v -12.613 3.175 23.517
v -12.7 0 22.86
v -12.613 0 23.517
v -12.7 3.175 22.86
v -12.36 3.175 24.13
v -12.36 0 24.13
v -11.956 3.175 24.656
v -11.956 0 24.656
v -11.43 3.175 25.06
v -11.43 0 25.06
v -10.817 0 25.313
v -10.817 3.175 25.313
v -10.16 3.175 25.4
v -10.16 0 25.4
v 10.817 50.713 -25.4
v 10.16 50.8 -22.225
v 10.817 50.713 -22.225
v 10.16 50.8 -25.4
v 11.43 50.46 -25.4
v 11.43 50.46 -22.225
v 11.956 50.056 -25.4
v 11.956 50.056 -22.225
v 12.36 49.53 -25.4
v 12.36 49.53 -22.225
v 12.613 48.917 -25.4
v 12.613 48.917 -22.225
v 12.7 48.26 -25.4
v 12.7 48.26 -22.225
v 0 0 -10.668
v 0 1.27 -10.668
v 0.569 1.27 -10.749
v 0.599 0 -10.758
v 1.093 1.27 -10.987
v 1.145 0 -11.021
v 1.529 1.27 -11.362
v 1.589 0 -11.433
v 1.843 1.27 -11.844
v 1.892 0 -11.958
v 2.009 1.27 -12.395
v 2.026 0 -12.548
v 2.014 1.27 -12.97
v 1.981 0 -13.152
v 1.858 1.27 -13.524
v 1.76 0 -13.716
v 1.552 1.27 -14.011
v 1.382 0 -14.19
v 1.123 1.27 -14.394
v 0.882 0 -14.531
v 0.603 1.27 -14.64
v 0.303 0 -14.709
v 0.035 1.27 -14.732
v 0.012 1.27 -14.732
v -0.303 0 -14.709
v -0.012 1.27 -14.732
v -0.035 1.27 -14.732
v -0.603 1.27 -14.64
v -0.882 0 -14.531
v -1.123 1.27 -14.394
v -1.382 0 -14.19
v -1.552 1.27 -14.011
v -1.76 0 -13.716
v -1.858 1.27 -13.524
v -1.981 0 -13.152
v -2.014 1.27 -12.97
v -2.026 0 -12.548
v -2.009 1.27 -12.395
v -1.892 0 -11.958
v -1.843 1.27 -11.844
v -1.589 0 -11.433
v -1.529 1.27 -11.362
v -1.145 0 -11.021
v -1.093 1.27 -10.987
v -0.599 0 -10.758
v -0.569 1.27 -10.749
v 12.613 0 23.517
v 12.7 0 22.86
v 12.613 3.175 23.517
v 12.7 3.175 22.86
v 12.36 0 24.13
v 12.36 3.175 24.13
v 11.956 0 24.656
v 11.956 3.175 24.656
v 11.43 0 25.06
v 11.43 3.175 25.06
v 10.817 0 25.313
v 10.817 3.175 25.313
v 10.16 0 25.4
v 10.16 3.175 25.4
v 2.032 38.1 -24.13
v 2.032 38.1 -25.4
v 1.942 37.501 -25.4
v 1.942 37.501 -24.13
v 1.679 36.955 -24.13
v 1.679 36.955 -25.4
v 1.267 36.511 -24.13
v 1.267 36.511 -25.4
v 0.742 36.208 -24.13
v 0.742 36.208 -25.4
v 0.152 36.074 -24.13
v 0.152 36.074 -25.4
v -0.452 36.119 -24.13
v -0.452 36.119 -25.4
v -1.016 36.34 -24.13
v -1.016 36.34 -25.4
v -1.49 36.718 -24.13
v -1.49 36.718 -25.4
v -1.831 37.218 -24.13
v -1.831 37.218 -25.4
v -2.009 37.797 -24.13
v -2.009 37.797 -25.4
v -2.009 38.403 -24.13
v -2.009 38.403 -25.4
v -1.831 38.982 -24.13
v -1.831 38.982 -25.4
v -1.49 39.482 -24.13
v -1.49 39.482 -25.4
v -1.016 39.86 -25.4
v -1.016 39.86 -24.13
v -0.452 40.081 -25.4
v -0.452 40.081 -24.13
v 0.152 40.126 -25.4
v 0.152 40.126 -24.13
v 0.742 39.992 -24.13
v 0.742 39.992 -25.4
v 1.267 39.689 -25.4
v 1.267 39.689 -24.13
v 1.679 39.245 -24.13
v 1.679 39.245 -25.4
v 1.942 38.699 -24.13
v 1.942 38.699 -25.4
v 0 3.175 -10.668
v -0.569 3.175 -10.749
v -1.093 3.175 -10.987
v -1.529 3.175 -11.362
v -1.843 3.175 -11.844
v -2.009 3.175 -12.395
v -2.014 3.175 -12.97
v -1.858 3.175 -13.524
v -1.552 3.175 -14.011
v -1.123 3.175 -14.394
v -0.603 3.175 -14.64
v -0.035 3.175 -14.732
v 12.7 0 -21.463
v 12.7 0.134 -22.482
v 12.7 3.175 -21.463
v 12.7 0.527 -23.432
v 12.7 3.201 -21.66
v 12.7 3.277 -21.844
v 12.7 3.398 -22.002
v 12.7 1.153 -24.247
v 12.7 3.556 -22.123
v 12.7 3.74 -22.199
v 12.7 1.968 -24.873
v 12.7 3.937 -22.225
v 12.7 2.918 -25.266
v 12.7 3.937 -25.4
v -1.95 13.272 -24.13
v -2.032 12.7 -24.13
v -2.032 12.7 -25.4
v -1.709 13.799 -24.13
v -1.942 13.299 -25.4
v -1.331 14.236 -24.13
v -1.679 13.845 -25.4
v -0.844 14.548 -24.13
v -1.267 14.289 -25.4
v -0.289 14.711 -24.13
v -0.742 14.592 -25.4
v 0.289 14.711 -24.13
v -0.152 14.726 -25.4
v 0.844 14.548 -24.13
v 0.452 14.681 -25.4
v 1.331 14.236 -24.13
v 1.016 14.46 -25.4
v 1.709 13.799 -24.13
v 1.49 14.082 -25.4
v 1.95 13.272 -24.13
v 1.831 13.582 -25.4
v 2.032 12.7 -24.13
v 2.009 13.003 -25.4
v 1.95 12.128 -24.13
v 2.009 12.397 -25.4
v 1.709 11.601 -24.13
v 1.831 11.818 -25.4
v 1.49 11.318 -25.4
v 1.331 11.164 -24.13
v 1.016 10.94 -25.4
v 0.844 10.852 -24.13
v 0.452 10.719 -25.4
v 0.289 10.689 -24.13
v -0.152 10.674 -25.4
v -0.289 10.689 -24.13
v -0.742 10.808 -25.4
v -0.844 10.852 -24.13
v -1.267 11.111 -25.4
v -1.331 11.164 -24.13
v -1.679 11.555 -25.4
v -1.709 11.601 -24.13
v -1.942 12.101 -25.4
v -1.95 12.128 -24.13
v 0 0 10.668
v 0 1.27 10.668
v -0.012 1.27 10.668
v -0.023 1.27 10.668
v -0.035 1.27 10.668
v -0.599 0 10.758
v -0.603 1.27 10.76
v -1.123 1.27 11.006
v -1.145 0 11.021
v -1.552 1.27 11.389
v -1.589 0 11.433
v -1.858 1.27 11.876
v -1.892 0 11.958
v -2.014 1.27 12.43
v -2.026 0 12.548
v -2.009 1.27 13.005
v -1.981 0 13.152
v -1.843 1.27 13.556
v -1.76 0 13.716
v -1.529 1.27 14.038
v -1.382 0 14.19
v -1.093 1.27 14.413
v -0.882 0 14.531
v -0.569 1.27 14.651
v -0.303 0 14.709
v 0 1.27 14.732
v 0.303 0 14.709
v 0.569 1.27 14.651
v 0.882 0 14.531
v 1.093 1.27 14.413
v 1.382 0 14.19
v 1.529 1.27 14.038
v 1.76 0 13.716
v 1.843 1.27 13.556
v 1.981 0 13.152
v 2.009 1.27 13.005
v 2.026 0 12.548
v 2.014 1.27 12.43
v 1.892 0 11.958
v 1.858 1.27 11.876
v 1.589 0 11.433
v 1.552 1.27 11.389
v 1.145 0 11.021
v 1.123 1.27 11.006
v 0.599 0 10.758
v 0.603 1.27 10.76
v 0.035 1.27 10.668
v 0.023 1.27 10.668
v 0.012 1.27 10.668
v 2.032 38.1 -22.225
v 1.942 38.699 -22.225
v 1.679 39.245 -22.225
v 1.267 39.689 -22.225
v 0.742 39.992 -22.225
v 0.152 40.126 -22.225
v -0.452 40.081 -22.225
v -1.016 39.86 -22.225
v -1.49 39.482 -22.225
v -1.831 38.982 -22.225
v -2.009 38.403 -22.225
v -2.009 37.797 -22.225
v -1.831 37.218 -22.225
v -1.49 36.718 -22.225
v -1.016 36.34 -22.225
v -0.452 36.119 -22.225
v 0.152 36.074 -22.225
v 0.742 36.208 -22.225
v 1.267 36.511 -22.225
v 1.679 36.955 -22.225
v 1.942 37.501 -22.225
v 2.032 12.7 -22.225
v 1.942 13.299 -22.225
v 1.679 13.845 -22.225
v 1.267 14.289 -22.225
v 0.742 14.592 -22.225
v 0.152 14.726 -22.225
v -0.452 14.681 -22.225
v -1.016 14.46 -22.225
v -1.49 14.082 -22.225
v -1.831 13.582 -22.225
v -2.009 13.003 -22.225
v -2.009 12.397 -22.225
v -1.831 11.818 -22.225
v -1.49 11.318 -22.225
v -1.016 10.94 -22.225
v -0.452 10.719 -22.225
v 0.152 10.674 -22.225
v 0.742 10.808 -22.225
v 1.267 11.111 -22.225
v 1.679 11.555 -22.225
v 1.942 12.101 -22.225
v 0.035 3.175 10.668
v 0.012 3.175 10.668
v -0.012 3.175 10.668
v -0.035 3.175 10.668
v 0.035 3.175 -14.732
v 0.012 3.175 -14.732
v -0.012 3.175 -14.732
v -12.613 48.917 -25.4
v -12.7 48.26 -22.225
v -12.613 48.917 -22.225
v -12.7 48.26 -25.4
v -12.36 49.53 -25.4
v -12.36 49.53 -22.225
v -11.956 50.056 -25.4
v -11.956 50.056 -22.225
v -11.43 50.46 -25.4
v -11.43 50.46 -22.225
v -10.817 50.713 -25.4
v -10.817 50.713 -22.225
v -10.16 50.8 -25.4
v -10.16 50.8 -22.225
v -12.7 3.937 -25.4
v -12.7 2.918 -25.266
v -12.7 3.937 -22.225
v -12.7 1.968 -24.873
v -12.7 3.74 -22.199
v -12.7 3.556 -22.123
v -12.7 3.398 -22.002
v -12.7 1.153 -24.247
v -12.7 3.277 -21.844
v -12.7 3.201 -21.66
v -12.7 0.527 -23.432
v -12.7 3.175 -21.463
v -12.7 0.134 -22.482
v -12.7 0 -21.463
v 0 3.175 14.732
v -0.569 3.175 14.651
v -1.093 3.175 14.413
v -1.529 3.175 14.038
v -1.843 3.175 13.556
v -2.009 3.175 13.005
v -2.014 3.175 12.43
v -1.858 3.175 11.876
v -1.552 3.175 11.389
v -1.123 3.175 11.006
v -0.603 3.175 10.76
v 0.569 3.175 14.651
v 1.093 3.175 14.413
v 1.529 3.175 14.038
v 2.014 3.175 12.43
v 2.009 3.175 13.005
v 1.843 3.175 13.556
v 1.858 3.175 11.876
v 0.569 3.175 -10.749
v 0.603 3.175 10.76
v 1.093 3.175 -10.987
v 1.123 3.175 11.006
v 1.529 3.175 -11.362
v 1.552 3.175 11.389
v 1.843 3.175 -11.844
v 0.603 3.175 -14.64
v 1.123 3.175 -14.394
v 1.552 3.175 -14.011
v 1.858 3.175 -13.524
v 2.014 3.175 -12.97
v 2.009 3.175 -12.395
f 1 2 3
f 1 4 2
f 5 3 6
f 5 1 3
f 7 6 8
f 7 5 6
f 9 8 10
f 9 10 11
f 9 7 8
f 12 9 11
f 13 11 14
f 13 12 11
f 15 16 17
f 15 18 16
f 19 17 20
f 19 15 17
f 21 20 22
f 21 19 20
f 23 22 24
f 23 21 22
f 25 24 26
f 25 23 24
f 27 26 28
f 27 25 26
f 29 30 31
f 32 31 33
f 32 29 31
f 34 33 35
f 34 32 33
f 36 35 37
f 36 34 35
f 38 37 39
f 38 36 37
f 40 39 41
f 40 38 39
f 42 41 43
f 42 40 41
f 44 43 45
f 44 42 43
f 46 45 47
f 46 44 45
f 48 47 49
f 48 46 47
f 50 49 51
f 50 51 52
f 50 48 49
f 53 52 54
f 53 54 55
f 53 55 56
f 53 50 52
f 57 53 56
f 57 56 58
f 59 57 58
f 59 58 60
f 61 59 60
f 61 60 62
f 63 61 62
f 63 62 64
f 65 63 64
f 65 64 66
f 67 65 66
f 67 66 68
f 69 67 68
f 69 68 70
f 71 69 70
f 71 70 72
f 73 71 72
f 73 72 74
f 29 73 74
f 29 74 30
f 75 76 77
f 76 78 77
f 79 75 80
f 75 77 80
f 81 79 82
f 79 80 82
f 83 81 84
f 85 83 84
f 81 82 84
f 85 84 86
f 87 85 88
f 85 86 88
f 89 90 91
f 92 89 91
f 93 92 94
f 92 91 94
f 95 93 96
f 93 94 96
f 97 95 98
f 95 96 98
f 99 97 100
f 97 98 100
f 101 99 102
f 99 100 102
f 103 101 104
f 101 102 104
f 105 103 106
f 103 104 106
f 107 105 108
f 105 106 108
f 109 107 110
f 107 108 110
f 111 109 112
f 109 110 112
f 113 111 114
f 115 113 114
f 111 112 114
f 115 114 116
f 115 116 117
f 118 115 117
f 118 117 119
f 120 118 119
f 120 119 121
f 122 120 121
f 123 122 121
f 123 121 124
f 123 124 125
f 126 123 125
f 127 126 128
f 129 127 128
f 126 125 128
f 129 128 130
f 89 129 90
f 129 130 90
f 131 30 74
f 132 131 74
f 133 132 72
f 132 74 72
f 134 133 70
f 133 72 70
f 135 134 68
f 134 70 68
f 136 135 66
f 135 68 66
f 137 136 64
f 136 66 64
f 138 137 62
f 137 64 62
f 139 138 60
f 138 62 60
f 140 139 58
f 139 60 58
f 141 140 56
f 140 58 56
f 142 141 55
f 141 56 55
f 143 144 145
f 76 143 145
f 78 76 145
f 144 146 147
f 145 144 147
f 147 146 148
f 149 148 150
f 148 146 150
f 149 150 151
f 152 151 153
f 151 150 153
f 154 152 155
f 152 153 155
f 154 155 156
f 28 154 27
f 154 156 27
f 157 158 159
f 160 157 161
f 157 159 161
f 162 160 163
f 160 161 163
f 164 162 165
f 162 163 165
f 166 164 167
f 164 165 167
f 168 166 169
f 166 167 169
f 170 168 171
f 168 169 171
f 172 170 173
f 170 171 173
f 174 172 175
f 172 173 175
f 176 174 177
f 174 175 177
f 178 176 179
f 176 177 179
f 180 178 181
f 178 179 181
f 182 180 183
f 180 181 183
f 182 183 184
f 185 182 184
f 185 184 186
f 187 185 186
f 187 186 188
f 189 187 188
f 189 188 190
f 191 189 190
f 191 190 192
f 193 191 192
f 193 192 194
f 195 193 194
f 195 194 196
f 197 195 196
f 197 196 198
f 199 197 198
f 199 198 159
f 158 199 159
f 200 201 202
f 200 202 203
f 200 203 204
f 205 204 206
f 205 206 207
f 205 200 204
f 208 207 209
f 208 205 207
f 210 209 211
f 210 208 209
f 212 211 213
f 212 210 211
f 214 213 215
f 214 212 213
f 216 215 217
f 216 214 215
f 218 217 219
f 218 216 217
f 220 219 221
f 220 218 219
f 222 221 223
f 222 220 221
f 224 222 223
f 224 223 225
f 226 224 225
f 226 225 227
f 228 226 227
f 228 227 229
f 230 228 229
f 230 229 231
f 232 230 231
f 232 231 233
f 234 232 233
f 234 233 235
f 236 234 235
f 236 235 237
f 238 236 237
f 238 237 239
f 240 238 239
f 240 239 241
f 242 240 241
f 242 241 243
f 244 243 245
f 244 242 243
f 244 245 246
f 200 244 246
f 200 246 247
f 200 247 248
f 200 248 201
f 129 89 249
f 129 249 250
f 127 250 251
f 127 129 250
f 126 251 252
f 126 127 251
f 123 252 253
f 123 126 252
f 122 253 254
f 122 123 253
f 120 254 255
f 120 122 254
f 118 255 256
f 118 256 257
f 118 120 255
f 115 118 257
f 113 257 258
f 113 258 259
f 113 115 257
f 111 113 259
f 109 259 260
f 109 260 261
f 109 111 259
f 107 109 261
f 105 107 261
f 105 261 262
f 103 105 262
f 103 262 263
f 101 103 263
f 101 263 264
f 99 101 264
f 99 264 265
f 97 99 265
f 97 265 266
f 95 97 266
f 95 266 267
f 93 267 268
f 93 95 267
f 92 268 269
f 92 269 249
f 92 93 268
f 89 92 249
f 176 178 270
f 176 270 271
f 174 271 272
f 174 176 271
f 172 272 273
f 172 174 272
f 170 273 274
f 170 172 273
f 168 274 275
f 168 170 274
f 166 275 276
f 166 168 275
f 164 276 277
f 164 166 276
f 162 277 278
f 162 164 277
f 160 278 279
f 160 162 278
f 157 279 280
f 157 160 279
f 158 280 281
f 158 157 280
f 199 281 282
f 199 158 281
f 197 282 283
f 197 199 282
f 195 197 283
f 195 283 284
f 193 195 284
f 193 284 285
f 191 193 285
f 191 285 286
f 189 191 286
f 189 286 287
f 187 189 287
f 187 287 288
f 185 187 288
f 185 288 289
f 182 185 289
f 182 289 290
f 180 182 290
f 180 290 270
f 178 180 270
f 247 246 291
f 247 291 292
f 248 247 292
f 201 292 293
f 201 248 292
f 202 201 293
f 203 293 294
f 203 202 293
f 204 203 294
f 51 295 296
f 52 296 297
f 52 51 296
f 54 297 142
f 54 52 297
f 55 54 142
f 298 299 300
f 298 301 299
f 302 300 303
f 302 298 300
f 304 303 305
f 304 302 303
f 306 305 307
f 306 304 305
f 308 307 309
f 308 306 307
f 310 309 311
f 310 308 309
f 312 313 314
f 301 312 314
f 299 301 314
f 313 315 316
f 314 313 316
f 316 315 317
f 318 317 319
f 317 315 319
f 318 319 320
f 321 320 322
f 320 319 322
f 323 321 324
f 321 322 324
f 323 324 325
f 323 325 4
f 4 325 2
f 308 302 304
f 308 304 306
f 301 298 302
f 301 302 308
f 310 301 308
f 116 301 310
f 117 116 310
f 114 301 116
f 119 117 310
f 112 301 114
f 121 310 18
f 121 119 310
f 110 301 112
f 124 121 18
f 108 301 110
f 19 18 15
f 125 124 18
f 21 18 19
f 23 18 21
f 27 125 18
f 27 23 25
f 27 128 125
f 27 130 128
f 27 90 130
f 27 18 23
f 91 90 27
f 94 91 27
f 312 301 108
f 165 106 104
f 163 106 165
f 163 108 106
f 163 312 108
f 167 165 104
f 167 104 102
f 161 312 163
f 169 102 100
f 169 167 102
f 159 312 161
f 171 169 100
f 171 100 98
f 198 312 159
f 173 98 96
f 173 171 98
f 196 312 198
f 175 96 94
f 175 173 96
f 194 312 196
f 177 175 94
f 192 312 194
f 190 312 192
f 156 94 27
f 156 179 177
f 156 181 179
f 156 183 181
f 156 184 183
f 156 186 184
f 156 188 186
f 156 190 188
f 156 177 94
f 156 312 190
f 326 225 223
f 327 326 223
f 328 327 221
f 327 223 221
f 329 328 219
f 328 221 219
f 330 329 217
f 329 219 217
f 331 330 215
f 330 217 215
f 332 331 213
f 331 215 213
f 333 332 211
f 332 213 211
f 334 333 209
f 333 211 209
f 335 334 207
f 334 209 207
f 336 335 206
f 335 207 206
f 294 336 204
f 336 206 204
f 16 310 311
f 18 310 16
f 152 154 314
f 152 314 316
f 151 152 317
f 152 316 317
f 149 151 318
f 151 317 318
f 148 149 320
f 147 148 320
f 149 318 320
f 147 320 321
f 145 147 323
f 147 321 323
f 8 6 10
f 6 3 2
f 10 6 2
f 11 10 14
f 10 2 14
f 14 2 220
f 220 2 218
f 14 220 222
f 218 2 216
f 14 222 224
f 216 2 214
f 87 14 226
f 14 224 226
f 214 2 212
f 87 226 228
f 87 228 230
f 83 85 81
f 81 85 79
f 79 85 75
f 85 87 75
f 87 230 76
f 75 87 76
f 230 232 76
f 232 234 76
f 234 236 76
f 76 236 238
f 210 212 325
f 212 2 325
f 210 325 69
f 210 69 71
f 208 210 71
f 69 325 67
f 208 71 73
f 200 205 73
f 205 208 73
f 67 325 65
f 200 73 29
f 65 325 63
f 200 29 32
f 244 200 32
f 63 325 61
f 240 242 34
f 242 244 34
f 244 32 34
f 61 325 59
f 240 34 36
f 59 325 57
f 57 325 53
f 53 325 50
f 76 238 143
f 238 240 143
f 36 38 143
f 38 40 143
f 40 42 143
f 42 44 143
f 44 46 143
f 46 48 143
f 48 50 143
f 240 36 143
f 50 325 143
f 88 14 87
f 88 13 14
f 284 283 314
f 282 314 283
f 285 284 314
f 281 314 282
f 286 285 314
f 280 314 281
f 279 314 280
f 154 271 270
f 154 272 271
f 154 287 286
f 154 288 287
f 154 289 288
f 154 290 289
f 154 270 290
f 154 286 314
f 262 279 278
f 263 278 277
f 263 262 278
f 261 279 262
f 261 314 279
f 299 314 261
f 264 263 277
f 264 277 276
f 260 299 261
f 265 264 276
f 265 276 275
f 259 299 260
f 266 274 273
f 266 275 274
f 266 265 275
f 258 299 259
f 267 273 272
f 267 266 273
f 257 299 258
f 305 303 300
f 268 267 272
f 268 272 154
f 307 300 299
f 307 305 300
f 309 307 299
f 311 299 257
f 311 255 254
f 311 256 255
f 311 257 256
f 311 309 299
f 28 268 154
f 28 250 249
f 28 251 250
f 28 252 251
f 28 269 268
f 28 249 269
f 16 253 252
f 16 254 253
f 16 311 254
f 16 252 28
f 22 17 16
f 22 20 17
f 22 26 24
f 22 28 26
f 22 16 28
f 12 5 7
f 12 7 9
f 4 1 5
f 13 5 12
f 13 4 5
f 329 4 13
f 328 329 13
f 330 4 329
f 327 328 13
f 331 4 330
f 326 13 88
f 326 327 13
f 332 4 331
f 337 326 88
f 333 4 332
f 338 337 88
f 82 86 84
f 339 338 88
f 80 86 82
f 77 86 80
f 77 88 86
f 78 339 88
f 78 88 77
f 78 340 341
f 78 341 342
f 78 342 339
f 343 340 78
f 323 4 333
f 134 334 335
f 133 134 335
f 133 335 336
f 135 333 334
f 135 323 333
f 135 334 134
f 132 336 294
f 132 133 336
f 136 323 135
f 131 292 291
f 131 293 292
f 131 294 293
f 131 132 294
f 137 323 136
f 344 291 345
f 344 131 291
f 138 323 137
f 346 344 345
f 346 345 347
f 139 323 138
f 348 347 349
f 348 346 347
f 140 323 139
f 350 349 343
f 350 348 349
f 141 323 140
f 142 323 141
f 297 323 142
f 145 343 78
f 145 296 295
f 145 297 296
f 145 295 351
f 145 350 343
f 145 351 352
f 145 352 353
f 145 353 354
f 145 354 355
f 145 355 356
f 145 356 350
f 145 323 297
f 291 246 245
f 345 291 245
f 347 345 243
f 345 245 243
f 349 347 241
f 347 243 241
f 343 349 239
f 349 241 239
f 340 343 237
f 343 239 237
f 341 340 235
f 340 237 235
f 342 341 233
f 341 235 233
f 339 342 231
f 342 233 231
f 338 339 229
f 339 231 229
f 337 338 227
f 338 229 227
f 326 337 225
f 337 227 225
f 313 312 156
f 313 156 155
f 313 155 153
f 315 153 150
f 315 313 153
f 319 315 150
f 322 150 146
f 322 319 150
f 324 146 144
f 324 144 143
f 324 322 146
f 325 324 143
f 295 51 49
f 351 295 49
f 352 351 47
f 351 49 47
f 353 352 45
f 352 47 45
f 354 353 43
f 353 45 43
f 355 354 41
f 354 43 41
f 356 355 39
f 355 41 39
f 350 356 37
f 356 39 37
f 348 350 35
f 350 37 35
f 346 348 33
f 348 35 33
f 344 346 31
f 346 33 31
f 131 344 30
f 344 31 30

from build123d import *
from build123d.topology import SkipClean

# Parameters (mm, degrees)
SKETCH1_W                  = 25.4
SKETCH1_H                  = 50.8
SKETCH1_R                  = 2.032
BOSS_EXTRUDE1_DEPTH        = 1.27
SKETCH2_W                  = 25.4
SKETCH2_H                  = 50.8
SKETCH2_R                  = 2.032
BOSS_EXTRUDE2_DEPTH        = 1.27
CONVERT_SOLID2_START       = -24.13
CONVERT_SOLID2_OUTLINE_W   = 25.4
CONVERT_SOLID2_OUTLINE_H   = 49.53
CONVERT_SOLID2_OUTLINE_R   = 2.032
CONVERT_SOLID2_DEPTH       = 1.905
CONVERT_SOLID2_START_2     = -10.6679999
CONVERT_SOLID2_2_OUTLINE_W = 25.4
CONVERT_SOLID2_2_OUTLINE_H = 1.905
CONVERT_SOLID2_2_DEPTH     = 21.336301023
CONVERT_SOLID2_START_3     = 14.7320001
CONVERT_SOLID2_3_OUTLINE_W = 25.4
CONVERT_SOLID2_3_OUTLINE_H = 1.905
CONVERT_SOLID2_3_DEPTH     = 10.6679999
CONVERT_SOLID2_START_4     = -22.225
CONVERT_SOLID2_4_OUTLINE_W = 25.4
CONVERT_SOLID2_4_OUTLINE_H = 1.905
CONVERT_SOLID2_4_DEPTH     = 7.493301123
CONVERT_SOLID2_START_5     = 1.27
CONVERT_SOLID2_5_DEPTH     = 1.905
CONVERT_SOLID2_6_DEPTH     = 1.905
CONVERT_SOLID2_START_6     = -14
CONVERT_SOLID2_7_DEPTH     = 28
CONVERT_SOLID2_START_7     = -12.7
CONVERT_SOLID2_8_DEPTH     = 25.4
FILLET1_R                  = 2.54


with BuildPart() as part:
    # Sketch1 → Boss-Extrude1 (new body)
    with BuildSketch(Plane(origin=(0, 0, 0), x_dir=(1, 0, 0), z_dir=(0, 1, 0))):
        Rectangle(SKETCH1_W, SKETCH1_H)
        with Locations(Location((0, 12.7, 0), (0, 0, 270))):
            Circle(SKETCH1_R, mode=Mode.SUBTRACT)
        with Locations(Location((0, -12.7, 0), (0, 0, 90))):
            Circle(SKETCH1_R, mode=Mode.SUBTRACT)
    extrude(amount=BOSS_EXTRUDE1_DEPTH)

    # Sketch2 → Boss-Extrude2 (add)
    with BuildSketch(Plane(origin=(0, 0, -25.4), x_dir=(-1, 0, 0), z_dir=(0, 0, -1))):
        with Locations((0, 25.4)):
            Rectangle(SKETCH2_W, SKETCH2_H)
        with Locations((0, 12.7)):
            Circle(SKETCH2_R, mode=Mode.SUBTRACT)
        with Locations(Location((0, 38.1, 0), (0, 0, 180))):
            Circle(SKETCH2_R, mode=Mode.SUBTRACT)
    extrude(amount=-BOSS_EXTRUDE2_DEPTH)

    # Convert-Solid2: read off the stored shape, not the designer's step
    # Convert-Solid2 outline → Convert-Solid2 (add)
    with SkipClean():  # the faces are left unmerged after this step: merging them gives an invalid solid
        with BuildSketch(Plane.XY.offset(CONVERT_SOLID2_START)):
            with Locations((0, 26.035)):
                Rectangle(CONVERT_SOLID2_OUTLINE_W, CONVERT_SOLID2_OUTLINE_H)
            with Locations((0, 12.7)):
                Circle(CONVERT_SOLID2_OUTLINE_R, mode=Mode.SUBTRACT)
            with Locations((0, 38.1)):
                Circle(CONVERT_SOLID2_OUTLINE_R, mode=Mode.SUBTRACT)
        extrude(amount=CONVERT_SOLID2_DEPTH)
    add(part.part.scale(1), mode=Mode.REPLACE)  # the faces are merged on a copy

    # Convert-Solid2 2 outline → Convert-Solid2 2 (add)
    with BuildSketch(Plane.XY.offset(CONVERT_SOLID2_START_2)):
        with Locations((0, 2.2225)):
            Rectangle(CONVERT_SOLID2_2_OUTLINE_W, CONVERT_SOLID2_2_OUTLINE_H)
    extrude(amount=CONVERT_SOLID2_2_DEPTH)

    # Convert-Solid2 3 outline → Convert-Solid2 3 (add)
    with BuildSketch(Plane.XY.offset(CONVERT_SOLID2_START_3)):
        with Locations((0, 2.2225)):
            Rectangle(CONVERT_SOLID2_3_OUTLINE_W, CONVERT_SOLID2_3_OUTLINE_H)
    extrude(amount=CONVERT_SOLID2_3_DEPTH)

    # Convert-Solid2 4 outline → Convert-Solid2 4 (add)
    with BuildSketch(Plane.XY.offset(CONVERT_SOLID2_START_4)):
        with Locations((0, 2.2225)):
            Rectangle(CONVERT_SOLID2_4_OUTLINE_W, CONVERT_SOLID2_4_OUTLINE_H)
    extrude(amount=CONVERT_SOLID2_4_DEPTH)

    # Convert-Solid2 5 outline → Convert-Solid2 5 (cut)
    with BuildSketch(Plane(origin=(0, 0, 0), x_dir=(1, 0, 0), z_dir=(0, 1, 0)).offset(CONVERT_SOLID2_START_5)):
        with BuildLine():
            ThreePointArc((0.034981041, -10.668301123), (0, -10.668), (-0.034981041, -10.668301123))
            Line((-0.034981041, -10.668301123), (0.034981041, -10.668301123))
        make_face()
        with BuildLine():
            ThreePointArc((0.034981041, 14.731698877), (0, 14.732), (-0.034981041, 14.731698877))
            Line((-0.034981041, 14.731698877), (0.034981041, 14.731698877))
        make_face()
    extrude(amount=CONVERT_SOLID2_5_DEPTH, mode=Mode.SUBTRACT)

    # Convert-Solid2 6 outline → Convert-Solid2 6 (add)
    with BuildSketch(Plane(origin=(0, 0, 0), x_dir=(1, 0, 0), z_dir=(0, 1, 0)).offset(CONVERT_SOLID2_START_5)):
        with BuildLine():
            Line((-12.7, -10.668301123), (-12.7, -14.7320001))
            Line((-12.7, -14.7320001), (0, -14.732))
            ThreePointArc((0, -14.732), (-2.031924718, -12.717491168), (-0.034981041, -10.668301123))
            Line((-0.034981041, -10.668301123), (-12.7, -10.668301123))
        make_face()
        with BuildLine():
            ThreePointArc((0.034981041, -10.668301123), (2.031924718, -12.717491168), (0, -14.732))
            Line((0, -14.732), (12.7, -14.7320001))
            Line((12.7, -14.7320001), (12.7, -10.668301123))
            Line((12.7, -10.668301123), (0.034981041, -10.668301123))
        make_face()
        with BuildLine():
            Line((-12.7, 14.731698877), (-12.7, 10.6679999))
            Line((-12.7, 10.6679999), (0, 10.668))
            ThreePointArc((0, 10.668), (-2.031924718, 12.682508832), (-0.034981041, 14.731698877))
            Line((-0.034981041, 14.731698877), (-12.7, 14.731698877))
        make_face()
        with BuildLine():
            ThreePointArc((0.034981041, 14.731698877), (2.031924718, 12.682508832), (0, 10.668))
            Line((0, 10.668), (12.7, 10.6679999))
            Line((12.7, 10.6679999), (12.7, 14.731698877))
            Line((12.7, 14.731698877), (0.034981041, 14.731698877))
        make_face()
    extrude(amount=CONVERT_SOLID2_6_DEPTH)

    # Convert-Solid2 7 outline → Convert-Solid2 7 (cut)
    with SkipClean():  # the faces are left unmerged after this step: merging them gives an invalid solid
        with BuildSketch(Plane.YZ.offset(CONVERT_SOLID2_START_6)):
            with BuildLine():
                ThreePointArc((3.937, -25.4), (1.153120602, -24.246879398), (0, -21.463))
                Line((0, -21.463), (0, -25.4))
                Line((0, -25.4), (3.937, -25.4))
            make_face()
        extrude(amount=CONVERT_SOLID2_7_DEPTH, mode=Mode.SUBTRACT)

    # Convert-Solid2 8 outline → Convert-Solid2 8 (add)
    with SkipClean():  # the faces are left unmerged after this step: merging them gives an invalid solid
        with BuildSketch(Plane.YZ.offset(CONVERT_SOLID2_START_7)):
            with BuildLine():
                ThreePointArc((3.937, -22.225), (3.398184633, -22.001815367), (3.175, -21.463))
                Line((3.175, -21.463), (3.175, -22.225))
                Line((3.175, -22.225), (3.937, -22.225))
            make_face()
        extrude(amount=CONVERT_SOLID2_8_DEPTH)

    # Fillet1
    fillet1_edges = [part.edges().sort_by_distance(p)[0] for p in [
        (-12.7, 1.5875, 25.4),
        (12.7, 1.5875, 25.4),
        (12.7, 50.8, -23.8125),
        (-12.7, 50.8, -23.8125),
    ]]
    fillet(fillet1_edges, radius=FILLET1_R)


solid = part.part
